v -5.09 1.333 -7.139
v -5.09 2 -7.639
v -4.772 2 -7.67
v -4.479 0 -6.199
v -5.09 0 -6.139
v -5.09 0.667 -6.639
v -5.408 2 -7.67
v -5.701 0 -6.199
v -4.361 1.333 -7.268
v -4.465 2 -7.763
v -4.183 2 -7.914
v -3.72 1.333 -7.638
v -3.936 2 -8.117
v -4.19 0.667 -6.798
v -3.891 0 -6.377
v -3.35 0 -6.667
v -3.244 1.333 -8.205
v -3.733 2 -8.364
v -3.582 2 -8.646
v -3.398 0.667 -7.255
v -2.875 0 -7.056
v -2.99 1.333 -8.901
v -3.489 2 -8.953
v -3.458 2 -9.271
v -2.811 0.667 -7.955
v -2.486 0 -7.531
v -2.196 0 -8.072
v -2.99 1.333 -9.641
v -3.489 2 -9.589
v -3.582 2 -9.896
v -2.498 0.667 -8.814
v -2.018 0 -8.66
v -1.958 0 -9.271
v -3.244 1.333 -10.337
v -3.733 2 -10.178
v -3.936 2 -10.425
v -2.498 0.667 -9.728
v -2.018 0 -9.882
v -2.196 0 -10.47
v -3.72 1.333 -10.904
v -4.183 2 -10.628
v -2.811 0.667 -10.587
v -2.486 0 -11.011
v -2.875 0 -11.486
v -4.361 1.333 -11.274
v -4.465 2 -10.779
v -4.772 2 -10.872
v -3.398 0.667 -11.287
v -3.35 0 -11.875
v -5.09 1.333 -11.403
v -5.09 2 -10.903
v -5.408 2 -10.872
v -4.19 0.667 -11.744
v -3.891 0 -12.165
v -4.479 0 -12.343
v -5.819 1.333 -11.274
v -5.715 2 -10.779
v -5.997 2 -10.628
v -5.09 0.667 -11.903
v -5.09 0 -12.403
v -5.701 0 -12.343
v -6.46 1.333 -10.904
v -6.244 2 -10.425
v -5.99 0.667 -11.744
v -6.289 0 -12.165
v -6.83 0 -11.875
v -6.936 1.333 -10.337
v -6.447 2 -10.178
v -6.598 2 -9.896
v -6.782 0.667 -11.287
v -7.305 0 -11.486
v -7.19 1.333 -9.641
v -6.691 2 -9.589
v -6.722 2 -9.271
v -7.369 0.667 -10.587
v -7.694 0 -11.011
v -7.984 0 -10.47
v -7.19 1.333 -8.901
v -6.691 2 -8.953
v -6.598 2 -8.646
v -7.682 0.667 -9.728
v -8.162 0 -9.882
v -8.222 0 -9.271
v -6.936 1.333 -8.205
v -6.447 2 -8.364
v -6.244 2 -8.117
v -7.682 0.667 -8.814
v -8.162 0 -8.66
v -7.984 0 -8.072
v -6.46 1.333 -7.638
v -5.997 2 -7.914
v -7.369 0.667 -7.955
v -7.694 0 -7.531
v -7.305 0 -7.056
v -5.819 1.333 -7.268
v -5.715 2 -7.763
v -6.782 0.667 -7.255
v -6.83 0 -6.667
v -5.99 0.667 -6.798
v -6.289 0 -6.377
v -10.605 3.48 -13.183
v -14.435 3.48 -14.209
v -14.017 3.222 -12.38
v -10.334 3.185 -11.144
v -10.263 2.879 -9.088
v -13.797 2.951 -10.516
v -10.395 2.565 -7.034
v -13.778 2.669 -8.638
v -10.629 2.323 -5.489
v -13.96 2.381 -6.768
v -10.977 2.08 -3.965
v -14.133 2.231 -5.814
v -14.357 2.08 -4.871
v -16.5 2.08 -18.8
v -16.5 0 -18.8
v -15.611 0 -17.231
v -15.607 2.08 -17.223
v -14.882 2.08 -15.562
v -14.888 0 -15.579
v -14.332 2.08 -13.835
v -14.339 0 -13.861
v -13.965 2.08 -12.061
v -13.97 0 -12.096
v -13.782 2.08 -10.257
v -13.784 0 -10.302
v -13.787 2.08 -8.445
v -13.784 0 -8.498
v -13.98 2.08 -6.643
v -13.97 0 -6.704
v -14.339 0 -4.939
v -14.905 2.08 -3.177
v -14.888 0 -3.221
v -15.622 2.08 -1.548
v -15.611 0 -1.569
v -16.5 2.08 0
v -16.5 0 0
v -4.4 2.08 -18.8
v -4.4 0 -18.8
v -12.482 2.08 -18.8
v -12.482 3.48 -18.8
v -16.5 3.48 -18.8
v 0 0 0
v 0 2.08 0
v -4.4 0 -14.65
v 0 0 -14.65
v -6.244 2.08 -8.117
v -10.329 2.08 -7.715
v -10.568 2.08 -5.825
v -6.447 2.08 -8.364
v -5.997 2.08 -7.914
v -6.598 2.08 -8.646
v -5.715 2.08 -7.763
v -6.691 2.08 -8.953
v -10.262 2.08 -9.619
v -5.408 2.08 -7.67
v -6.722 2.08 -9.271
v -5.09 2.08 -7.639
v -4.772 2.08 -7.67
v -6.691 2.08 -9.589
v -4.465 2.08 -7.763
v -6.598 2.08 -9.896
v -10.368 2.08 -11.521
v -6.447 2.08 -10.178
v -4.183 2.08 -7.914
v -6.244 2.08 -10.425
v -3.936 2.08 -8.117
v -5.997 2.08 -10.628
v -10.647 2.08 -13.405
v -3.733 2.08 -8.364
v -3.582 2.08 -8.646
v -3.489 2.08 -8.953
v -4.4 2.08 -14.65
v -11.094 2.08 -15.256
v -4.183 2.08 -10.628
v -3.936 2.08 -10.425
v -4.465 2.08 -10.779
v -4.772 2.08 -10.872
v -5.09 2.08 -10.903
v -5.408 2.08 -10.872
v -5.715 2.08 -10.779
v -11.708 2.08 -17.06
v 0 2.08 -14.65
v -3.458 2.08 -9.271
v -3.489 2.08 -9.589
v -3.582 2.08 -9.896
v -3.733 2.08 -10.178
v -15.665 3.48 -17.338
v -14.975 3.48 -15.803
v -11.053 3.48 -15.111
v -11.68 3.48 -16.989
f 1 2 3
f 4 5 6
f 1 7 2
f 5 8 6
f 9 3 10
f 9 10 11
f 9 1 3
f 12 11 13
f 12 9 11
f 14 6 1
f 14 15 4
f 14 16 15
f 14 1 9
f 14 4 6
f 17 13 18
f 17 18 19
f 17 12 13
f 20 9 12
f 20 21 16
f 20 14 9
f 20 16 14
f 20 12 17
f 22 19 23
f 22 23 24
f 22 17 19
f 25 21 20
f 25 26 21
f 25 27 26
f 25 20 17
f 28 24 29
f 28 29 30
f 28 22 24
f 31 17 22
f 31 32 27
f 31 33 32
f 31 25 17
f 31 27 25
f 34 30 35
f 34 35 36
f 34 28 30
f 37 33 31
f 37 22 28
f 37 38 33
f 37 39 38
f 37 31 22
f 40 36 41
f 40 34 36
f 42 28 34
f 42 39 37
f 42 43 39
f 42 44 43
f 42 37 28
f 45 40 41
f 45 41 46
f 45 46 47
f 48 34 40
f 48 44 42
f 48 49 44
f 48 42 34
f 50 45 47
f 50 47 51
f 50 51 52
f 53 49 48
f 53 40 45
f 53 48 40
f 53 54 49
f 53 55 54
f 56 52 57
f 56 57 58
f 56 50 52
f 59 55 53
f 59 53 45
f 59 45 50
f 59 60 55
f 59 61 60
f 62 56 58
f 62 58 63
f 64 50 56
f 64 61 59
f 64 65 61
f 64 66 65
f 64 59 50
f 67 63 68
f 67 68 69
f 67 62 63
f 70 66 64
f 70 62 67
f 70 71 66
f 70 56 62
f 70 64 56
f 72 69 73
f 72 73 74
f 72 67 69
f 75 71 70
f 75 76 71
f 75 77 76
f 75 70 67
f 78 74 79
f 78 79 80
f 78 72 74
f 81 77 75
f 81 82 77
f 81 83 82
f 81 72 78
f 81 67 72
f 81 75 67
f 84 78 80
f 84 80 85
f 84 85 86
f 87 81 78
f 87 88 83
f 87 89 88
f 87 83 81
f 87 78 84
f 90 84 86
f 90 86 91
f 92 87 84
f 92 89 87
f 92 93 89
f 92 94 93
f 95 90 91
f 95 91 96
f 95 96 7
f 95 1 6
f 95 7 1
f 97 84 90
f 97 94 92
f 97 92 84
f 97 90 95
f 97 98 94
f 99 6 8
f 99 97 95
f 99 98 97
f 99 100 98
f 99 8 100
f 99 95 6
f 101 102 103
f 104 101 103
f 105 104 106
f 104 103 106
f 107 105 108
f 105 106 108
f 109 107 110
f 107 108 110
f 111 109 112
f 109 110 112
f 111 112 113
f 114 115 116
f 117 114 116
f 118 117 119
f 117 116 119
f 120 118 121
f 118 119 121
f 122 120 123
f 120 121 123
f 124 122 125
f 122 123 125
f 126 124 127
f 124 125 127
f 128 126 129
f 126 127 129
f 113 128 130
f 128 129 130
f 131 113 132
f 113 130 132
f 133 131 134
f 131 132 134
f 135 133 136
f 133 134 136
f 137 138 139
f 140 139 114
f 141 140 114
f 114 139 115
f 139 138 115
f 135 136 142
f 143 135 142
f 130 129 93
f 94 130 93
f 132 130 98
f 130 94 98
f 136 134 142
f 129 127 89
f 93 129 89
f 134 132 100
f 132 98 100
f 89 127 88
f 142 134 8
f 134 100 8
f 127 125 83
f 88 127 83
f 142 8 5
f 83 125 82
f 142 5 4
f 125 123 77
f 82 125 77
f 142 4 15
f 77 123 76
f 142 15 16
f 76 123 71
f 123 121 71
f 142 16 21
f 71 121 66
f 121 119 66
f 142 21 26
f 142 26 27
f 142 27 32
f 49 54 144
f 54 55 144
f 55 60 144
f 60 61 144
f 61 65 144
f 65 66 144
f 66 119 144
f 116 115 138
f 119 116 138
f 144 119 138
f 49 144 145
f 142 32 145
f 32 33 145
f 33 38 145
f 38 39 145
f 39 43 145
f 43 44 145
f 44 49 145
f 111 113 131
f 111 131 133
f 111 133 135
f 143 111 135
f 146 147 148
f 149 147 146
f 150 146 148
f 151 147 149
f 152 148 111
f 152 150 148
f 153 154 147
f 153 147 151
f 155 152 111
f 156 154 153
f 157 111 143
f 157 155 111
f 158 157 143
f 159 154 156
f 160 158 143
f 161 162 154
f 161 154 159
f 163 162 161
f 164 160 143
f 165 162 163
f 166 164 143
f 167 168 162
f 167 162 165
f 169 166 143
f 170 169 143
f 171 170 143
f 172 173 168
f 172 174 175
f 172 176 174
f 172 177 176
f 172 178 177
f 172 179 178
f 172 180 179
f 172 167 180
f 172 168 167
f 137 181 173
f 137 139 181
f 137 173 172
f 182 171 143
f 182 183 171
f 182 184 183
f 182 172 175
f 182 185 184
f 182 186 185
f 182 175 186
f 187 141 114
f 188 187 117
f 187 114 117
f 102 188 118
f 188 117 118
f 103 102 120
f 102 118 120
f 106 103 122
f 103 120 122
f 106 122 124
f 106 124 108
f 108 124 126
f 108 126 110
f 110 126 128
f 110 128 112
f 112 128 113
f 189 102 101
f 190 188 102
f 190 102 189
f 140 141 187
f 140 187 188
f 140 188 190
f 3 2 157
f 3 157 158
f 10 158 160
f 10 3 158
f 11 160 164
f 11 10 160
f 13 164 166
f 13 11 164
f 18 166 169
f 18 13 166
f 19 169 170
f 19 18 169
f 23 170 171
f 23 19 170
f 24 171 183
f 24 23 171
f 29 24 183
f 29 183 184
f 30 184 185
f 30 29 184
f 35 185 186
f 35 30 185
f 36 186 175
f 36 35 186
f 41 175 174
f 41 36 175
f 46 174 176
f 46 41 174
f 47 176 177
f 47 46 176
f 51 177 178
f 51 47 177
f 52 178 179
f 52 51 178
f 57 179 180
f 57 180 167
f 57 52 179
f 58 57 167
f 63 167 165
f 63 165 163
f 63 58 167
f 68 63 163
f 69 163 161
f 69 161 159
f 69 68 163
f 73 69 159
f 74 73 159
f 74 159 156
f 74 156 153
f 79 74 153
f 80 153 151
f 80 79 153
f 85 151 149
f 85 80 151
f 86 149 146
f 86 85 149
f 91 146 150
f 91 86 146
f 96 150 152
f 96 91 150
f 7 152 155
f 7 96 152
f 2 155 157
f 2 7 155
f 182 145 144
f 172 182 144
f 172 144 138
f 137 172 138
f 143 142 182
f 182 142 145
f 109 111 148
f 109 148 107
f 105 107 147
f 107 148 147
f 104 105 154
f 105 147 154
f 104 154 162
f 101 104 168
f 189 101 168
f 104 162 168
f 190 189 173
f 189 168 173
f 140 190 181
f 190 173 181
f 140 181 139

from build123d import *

# Parameters (mm, degrees)
SKETCH1_R           = 1.631999871
BOSS_EXTRUDE1_DEPTH = 2.08
BOSS_EXTRUDE2_DEPTH = 1.4
CHAMFER1_SIZE       = 9
CHAMFER1_SIZE_2     = 1.4
CHAMFER2_SIZE       = 2
CHAMFER2_SIZE2      = 1.5


with BuildPart() as part:
    # Sketch1 → Boss-Extrude1 (new body)
    with BuildSketch(Plane(origin=(0, 0, 0), x_dir=(1, 0, 0), z_dir=(0, 1, 0))):
        with BuildLine():
            Line((-4.4, 14.65), (-4.4, 18.8))
            Line((-4.4, 18.8), (-16.5, 18.8))
            ThreePointArc((-16.5, 18.8), (-13.76109752, 9.4), (-16.5, 0))
            Line((-16.5, 0), (0, 0))
            Line((0, 0), (0, 14.65))
            Line((0, 14.65), (-4.4, 14.65))
        make_face()
        with Locations(Location((-5.09, 9.271001493, 0), (0, 0, 270))):
            Circle(SKETCH1_R, mode=Mode.SUBTRACT)
    extrude(amount=BOSS_EXTRUDE1_DEPTH)

    # Sketch2 → Boss-Extrude2 (add)
    with BuildSketch(Plane(origin=(0, 2.08, 0), x_dir=(1, 0, 0), z_dir=(0, 1, 0))):
        with BuildLine():
            Line((-12.482386169, 18.8), (-16.5, 18.8))
            ThreePointArc((-16.5, 18.8), (-13.964523784, 12.06055201), (-14.35739556, 4.870666711))
            Line((-14.35739556, 4.870666711), (-10.976655168, 3.964800053))
            ThreePointArc((-10.976655168, 3.964800053), (-10.36843652, 11.520546233), (-12.482386169, 18.8))
        make_face()
    extrude(amount=BOSS_EXTRUDE2_DEPTH)

    # Chamfer1
    # the kernel refuses this chamfer: 9, 1.4 mm, written as the material it takes off along each edge
    with BuildSketch(Plane(origin=(-36.950124299, 3.48, -10.924370131), x_dir=(0.25881451828946306, 0.005914407767472668, -0.9659089319927389), z_dir=(0.9659258262890682, 0, 0.2588190451025212))) as chamfer1_piece_1_section:
        Polygon((CHAMFER1_SIZE * 0.999982509737, -CHAMFER1_SIZE * 0.00591440776747), (-CHAMFER1_SIZE_2 * 0.00591440776747, -CHAMFER1_SIZE_2 * 0.999982509737), (0, 0), align=None)
    chamfer1_piece_1 = extrude(amount=50.279427829, mode=Mode.PRIVATE)
    chamfer1_piece_1 = split(chamfer1_piece_1, bisect_by=Plane(origin=(-11.82064593, 2.08, -7.576464434), z_dir=(0, 1, 0)), keep=Keep.TOP, mode=Mode.PRIVATE)
    add(chamfer1_piece_1, mode=Mode.SUBTRACT)

    # Chamfer2
    chamfer2_edges = [part.edges().sort_by_distance(p)[0] for p in [
        (-5.09, 0, -10.903001364),
    ]]
    chamfer2_side = [part.faces().sort_by_distance(p)[0] for p in [
        (-5.09, 1.04, -10.903001364),
    ]]
    chamfer(chamfer2_edges, length=CHAMFER2_SIZE, length2=CHAMFER2_SIZE2, reference=chamfer2_side[0])


solid = part.part
